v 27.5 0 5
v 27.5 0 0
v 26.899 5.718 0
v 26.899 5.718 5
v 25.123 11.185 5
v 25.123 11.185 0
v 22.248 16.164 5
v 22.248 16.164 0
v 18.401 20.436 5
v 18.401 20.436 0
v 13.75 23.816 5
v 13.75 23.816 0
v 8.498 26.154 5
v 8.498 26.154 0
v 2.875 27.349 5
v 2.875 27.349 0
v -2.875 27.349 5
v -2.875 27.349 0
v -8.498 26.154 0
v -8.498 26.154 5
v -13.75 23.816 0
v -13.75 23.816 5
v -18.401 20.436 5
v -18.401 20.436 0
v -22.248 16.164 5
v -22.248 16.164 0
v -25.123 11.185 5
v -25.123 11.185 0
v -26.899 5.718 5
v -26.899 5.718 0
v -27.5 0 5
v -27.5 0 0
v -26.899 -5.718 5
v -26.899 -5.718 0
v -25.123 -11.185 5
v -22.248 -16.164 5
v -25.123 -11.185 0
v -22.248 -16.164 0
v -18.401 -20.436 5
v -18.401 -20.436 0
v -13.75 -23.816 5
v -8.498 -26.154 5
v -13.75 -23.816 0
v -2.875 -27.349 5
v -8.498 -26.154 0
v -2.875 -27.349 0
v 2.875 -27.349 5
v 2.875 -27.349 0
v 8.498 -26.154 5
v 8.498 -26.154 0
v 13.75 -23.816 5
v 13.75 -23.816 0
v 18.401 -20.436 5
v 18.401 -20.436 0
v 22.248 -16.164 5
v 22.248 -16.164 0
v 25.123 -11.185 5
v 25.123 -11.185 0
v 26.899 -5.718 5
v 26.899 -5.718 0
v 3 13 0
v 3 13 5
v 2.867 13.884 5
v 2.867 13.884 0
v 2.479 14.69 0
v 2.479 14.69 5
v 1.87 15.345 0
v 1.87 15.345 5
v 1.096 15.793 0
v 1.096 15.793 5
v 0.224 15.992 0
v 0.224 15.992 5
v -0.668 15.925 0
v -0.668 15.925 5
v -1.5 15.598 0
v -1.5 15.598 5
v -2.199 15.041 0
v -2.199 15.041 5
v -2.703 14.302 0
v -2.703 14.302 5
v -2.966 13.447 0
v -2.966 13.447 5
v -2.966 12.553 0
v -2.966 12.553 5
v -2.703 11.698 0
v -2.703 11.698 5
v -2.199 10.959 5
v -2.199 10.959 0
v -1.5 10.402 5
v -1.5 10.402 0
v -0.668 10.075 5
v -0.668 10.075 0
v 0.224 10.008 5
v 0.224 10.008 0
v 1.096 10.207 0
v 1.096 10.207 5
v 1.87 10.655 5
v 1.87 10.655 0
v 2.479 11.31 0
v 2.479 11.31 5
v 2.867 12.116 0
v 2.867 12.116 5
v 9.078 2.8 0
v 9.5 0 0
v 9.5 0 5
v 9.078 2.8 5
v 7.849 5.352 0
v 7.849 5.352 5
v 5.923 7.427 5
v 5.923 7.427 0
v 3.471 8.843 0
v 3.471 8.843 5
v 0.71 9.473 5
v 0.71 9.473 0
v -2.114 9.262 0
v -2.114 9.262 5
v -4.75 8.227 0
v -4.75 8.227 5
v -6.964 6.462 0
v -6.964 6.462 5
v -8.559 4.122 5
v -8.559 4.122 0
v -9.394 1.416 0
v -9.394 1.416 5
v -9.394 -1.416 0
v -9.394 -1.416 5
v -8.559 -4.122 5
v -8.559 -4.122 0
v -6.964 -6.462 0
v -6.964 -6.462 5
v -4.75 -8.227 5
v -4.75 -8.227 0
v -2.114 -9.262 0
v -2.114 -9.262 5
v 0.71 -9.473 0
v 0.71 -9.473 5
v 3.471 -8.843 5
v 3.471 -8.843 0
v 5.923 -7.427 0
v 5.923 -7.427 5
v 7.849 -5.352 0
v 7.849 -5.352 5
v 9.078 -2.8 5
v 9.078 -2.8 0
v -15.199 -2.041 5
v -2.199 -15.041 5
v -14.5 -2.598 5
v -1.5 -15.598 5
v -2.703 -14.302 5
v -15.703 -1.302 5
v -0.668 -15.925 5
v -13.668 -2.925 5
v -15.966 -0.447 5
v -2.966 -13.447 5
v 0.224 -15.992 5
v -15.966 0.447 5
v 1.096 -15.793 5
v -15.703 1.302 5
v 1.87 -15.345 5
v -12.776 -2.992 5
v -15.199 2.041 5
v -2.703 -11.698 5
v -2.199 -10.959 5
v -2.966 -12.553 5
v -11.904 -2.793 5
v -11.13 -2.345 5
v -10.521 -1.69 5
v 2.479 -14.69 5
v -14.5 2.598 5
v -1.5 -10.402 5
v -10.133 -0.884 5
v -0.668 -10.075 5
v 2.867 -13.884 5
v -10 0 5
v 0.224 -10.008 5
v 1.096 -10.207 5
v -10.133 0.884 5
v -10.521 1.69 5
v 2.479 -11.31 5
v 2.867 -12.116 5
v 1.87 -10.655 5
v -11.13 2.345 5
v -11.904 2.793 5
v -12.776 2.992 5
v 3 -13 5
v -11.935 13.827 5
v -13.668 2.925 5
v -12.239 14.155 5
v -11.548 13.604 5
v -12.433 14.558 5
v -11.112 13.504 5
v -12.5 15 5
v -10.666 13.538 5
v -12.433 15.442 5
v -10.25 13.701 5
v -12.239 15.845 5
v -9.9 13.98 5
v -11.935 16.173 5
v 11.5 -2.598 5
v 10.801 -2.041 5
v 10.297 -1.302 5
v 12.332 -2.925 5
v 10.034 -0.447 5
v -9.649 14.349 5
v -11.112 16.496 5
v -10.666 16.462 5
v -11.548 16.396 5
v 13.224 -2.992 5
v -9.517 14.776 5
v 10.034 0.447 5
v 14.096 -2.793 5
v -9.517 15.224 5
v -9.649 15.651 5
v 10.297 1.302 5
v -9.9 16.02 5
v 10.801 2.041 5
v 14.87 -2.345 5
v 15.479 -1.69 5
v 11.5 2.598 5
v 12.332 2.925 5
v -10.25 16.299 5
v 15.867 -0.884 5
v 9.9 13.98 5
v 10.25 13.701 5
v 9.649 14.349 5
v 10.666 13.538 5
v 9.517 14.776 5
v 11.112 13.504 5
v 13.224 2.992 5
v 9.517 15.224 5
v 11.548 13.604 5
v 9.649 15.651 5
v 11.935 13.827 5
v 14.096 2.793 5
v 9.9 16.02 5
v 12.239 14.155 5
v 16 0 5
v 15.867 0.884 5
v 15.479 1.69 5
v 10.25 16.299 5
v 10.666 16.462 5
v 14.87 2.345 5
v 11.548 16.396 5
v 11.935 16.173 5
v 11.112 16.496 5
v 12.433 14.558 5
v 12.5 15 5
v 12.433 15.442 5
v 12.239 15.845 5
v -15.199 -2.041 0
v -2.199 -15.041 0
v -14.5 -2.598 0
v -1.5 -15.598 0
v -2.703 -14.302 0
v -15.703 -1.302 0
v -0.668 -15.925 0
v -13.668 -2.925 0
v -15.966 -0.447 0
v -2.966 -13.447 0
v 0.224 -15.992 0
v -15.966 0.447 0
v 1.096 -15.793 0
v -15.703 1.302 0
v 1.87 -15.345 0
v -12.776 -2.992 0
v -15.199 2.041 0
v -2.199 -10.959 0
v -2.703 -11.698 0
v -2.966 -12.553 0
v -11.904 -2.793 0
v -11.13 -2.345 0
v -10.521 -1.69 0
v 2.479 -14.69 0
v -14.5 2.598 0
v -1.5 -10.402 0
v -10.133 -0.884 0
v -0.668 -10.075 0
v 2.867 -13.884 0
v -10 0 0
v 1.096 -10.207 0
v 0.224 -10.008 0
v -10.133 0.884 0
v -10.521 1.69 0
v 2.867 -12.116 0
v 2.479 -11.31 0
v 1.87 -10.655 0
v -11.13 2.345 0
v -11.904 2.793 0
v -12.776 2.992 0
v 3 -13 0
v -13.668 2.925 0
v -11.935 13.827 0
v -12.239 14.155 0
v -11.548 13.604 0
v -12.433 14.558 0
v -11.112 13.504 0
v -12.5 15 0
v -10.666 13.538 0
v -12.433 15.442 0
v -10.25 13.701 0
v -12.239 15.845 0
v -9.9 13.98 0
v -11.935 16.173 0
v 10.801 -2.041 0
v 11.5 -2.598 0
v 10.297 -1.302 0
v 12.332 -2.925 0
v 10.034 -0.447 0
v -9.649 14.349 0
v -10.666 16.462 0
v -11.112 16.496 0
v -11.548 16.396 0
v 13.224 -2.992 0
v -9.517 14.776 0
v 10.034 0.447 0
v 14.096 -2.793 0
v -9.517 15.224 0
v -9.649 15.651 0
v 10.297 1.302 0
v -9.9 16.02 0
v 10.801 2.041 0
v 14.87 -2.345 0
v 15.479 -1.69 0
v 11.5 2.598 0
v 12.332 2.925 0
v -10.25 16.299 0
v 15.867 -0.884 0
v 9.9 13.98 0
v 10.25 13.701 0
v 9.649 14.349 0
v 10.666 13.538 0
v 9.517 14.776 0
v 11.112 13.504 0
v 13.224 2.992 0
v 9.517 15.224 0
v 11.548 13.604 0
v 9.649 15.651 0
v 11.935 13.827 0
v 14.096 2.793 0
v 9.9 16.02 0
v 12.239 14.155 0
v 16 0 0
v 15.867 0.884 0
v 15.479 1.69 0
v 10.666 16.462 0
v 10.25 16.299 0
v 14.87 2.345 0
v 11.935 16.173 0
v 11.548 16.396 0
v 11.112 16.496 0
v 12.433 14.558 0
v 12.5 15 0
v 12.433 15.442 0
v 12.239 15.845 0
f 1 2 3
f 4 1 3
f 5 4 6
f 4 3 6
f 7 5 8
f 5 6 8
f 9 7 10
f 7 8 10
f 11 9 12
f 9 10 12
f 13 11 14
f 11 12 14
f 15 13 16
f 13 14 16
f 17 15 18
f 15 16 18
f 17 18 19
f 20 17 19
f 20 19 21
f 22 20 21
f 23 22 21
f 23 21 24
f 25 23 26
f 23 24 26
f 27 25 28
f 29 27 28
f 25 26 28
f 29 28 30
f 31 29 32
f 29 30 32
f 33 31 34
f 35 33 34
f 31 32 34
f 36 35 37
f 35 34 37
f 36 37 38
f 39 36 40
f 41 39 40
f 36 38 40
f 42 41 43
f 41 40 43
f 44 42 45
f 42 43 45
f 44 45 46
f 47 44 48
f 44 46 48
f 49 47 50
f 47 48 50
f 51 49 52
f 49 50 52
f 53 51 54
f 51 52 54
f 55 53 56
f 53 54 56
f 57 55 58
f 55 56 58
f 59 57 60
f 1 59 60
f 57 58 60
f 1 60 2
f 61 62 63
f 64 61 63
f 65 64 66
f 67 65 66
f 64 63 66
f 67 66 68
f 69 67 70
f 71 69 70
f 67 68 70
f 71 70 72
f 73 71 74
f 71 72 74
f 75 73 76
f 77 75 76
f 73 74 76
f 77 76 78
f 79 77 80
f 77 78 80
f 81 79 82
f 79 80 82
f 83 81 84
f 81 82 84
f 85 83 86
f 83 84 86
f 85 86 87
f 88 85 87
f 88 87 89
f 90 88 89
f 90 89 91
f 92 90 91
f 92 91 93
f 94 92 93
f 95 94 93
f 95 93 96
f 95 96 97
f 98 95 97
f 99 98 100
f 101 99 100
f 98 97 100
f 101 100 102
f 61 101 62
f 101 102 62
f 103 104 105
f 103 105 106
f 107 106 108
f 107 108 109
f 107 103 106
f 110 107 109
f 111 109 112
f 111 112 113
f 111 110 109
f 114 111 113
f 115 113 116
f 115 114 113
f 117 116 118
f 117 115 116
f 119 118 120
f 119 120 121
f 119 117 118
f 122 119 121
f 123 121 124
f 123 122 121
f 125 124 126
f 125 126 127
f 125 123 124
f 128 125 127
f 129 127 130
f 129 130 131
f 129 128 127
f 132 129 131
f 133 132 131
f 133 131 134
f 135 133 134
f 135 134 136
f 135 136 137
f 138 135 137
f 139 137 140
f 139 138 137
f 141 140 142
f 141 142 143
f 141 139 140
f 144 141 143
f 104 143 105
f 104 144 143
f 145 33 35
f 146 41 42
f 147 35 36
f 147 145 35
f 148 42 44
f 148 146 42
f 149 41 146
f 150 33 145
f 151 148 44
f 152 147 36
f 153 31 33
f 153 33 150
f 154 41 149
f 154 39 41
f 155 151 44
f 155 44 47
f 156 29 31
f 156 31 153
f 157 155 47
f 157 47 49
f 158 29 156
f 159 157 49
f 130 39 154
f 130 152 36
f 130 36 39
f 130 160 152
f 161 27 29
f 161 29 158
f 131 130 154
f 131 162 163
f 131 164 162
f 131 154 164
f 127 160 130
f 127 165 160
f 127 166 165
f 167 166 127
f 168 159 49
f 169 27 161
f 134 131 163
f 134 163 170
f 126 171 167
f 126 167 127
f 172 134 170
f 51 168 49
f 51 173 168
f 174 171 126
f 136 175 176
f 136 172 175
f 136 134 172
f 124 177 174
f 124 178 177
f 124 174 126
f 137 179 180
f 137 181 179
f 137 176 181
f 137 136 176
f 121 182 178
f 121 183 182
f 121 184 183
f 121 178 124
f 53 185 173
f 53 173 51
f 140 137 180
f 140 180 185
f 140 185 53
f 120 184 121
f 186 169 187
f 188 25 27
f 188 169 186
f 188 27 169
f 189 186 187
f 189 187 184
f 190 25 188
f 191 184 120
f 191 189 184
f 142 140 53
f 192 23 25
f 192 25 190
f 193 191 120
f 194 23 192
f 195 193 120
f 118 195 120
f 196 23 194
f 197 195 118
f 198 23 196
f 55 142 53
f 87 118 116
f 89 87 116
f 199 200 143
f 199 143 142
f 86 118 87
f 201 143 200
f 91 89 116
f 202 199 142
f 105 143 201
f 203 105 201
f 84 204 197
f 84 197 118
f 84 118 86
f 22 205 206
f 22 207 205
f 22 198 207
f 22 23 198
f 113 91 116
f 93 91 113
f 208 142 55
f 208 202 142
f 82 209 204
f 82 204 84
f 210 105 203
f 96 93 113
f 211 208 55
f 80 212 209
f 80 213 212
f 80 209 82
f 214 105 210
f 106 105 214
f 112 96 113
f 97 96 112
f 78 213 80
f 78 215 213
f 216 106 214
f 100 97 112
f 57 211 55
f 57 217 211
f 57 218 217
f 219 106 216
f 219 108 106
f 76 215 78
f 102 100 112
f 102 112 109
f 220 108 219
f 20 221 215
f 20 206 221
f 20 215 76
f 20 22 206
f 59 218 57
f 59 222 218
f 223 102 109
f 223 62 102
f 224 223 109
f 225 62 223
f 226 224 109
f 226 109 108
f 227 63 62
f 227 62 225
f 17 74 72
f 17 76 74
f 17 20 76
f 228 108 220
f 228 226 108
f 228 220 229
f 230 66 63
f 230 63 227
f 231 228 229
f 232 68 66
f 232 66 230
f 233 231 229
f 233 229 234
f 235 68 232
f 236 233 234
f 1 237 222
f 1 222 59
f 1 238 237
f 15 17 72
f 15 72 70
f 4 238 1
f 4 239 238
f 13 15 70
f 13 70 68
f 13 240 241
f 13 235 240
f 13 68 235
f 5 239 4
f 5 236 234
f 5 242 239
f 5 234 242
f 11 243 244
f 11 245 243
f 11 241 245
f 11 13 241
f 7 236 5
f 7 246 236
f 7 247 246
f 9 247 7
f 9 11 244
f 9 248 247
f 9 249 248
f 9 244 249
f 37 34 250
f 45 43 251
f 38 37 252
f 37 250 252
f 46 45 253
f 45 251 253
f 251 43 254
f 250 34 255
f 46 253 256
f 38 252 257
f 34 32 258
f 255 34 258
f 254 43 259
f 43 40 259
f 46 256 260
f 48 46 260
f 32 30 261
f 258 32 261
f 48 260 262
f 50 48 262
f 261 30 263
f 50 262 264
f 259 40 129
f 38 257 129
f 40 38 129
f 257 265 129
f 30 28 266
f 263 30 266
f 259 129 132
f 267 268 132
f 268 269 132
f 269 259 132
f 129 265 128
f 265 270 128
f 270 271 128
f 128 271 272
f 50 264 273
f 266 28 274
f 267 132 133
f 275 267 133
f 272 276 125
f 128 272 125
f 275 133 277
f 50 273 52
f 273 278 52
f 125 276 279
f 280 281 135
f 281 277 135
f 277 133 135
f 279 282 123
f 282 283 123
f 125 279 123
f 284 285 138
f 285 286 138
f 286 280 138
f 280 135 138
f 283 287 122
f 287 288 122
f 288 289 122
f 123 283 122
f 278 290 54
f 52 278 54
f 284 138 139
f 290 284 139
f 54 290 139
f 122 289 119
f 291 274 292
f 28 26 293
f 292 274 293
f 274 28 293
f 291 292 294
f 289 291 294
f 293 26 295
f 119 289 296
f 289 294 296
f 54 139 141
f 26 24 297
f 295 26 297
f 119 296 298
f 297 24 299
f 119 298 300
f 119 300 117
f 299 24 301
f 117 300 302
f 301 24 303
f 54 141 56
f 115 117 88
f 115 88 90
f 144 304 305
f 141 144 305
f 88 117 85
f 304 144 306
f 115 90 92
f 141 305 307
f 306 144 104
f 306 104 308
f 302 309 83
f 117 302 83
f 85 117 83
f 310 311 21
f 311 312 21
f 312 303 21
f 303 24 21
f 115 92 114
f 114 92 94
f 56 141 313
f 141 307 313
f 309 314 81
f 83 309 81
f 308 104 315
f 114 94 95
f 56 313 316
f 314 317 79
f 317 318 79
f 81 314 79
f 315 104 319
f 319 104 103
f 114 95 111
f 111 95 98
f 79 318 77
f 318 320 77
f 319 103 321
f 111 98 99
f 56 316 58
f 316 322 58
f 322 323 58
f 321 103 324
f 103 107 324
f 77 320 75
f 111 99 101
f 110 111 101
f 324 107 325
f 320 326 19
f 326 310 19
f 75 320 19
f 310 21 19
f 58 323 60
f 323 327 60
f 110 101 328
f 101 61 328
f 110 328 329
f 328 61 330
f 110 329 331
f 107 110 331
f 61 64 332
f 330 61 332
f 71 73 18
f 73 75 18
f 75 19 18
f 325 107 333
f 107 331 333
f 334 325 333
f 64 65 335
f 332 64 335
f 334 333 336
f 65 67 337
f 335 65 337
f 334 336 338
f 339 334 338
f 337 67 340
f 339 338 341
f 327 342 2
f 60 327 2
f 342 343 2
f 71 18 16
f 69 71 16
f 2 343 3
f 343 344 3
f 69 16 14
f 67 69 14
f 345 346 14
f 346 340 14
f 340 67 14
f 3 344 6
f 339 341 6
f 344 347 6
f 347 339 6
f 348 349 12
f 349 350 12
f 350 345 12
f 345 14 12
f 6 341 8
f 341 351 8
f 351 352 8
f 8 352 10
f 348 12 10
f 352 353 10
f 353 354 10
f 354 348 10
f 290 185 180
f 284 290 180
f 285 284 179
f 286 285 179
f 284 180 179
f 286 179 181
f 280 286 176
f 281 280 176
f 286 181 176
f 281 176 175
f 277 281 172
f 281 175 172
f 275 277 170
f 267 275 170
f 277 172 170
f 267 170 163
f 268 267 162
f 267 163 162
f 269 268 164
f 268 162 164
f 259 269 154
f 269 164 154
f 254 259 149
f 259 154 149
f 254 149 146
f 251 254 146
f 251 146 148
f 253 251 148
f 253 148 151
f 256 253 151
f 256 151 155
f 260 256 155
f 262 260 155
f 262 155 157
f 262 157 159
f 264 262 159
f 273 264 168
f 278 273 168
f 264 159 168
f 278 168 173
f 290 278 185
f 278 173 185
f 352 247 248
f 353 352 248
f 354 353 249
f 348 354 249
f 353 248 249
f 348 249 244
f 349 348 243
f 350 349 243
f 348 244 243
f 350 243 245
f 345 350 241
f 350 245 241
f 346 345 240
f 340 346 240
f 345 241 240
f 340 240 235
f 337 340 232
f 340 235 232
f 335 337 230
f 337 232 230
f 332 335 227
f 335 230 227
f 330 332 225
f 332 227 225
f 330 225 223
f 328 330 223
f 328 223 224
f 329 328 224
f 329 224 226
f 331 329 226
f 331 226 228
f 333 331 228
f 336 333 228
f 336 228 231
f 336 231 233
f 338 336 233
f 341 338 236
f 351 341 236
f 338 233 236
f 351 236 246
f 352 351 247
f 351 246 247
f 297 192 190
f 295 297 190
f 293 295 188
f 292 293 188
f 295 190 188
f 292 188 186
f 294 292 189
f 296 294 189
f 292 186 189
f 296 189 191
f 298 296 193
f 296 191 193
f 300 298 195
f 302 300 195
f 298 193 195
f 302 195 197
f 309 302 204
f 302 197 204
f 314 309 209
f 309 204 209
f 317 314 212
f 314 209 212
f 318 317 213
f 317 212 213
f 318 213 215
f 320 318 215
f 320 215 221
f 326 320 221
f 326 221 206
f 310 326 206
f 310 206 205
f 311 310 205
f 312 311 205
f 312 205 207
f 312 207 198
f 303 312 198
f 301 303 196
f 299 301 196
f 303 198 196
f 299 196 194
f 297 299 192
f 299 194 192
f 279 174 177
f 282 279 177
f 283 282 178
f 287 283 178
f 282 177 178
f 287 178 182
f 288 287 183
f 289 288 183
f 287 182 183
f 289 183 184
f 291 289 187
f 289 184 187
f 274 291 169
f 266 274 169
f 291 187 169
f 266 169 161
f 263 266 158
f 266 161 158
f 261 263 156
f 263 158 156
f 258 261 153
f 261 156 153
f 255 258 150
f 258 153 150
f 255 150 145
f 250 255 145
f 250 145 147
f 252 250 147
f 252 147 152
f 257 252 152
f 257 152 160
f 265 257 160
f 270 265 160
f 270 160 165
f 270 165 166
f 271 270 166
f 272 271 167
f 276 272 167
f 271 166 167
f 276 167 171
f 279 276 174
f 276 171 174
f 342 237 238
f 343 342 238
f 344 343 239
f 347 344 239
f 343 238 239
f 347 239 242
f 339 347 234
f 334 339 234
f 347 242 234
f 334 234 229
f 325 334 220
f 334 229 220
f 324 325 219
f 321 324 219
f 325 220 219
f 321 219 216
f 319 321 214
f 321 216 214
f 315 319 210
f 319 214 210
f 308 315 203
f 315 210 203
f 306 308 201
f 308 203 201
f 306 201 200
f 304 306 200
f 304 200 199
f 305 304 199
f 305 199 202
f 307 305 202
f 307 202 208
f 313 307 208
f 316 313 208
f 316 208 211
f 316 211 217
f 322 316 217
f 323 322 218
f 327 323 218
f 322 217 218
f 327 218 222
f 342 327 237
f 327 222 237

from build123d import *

# Parameters (mm, degrees)
ESQUISSE1_R             = 27.5
ESQUISSE1_R_2           = 9.5
BOSS_EXTRU_1_DEPTH      = 5
ESQUISSE2_R             = 3
ESQUISSE2_R_2           = 1.5
ENL_V_MAT_EXTRU_1_DEPTH = 5


with BuildPart() as part:
    # Esquisse1 → Boss.-Extru.1 (new body)
    with BuildSketch(Plane.XY):
        Circle(ESQUISSE1_R)
        Circle(ESQUISSE1_R_2, mode=Mode.SUBTRACT)
    extrude(amount=BOSS_EXTRU_1_DEPTH)

    # Esquisse2 → Enlèv. mat.-Extru.1 (cut)
    with BuildSketch(Plane.XY.offset(5)):
        with Locations((-13, 0)):
            Circle(ESQUISSE2_R)
        with Locations((0, 13)):
            Circle(ESQUISSE2_R)
        with Locations((13, 0)):
            Circle(ESQUISSE2_R)
        with Locations((0, -13)):
            Circle(ESQUISSE2_R)
        with Locations((11, 15)):
            Circle(ESQUISSE2_R_2)
        with Locations(Location((-11, 15, 0), (0, 0, 180))):
            Circle(ESQUISSE2_R_2)
    extrude(amount=-ENL_V_MAT_EXTRU_1_DEPTH, mode=Mode.SUBTRACT)


solid = part.part
